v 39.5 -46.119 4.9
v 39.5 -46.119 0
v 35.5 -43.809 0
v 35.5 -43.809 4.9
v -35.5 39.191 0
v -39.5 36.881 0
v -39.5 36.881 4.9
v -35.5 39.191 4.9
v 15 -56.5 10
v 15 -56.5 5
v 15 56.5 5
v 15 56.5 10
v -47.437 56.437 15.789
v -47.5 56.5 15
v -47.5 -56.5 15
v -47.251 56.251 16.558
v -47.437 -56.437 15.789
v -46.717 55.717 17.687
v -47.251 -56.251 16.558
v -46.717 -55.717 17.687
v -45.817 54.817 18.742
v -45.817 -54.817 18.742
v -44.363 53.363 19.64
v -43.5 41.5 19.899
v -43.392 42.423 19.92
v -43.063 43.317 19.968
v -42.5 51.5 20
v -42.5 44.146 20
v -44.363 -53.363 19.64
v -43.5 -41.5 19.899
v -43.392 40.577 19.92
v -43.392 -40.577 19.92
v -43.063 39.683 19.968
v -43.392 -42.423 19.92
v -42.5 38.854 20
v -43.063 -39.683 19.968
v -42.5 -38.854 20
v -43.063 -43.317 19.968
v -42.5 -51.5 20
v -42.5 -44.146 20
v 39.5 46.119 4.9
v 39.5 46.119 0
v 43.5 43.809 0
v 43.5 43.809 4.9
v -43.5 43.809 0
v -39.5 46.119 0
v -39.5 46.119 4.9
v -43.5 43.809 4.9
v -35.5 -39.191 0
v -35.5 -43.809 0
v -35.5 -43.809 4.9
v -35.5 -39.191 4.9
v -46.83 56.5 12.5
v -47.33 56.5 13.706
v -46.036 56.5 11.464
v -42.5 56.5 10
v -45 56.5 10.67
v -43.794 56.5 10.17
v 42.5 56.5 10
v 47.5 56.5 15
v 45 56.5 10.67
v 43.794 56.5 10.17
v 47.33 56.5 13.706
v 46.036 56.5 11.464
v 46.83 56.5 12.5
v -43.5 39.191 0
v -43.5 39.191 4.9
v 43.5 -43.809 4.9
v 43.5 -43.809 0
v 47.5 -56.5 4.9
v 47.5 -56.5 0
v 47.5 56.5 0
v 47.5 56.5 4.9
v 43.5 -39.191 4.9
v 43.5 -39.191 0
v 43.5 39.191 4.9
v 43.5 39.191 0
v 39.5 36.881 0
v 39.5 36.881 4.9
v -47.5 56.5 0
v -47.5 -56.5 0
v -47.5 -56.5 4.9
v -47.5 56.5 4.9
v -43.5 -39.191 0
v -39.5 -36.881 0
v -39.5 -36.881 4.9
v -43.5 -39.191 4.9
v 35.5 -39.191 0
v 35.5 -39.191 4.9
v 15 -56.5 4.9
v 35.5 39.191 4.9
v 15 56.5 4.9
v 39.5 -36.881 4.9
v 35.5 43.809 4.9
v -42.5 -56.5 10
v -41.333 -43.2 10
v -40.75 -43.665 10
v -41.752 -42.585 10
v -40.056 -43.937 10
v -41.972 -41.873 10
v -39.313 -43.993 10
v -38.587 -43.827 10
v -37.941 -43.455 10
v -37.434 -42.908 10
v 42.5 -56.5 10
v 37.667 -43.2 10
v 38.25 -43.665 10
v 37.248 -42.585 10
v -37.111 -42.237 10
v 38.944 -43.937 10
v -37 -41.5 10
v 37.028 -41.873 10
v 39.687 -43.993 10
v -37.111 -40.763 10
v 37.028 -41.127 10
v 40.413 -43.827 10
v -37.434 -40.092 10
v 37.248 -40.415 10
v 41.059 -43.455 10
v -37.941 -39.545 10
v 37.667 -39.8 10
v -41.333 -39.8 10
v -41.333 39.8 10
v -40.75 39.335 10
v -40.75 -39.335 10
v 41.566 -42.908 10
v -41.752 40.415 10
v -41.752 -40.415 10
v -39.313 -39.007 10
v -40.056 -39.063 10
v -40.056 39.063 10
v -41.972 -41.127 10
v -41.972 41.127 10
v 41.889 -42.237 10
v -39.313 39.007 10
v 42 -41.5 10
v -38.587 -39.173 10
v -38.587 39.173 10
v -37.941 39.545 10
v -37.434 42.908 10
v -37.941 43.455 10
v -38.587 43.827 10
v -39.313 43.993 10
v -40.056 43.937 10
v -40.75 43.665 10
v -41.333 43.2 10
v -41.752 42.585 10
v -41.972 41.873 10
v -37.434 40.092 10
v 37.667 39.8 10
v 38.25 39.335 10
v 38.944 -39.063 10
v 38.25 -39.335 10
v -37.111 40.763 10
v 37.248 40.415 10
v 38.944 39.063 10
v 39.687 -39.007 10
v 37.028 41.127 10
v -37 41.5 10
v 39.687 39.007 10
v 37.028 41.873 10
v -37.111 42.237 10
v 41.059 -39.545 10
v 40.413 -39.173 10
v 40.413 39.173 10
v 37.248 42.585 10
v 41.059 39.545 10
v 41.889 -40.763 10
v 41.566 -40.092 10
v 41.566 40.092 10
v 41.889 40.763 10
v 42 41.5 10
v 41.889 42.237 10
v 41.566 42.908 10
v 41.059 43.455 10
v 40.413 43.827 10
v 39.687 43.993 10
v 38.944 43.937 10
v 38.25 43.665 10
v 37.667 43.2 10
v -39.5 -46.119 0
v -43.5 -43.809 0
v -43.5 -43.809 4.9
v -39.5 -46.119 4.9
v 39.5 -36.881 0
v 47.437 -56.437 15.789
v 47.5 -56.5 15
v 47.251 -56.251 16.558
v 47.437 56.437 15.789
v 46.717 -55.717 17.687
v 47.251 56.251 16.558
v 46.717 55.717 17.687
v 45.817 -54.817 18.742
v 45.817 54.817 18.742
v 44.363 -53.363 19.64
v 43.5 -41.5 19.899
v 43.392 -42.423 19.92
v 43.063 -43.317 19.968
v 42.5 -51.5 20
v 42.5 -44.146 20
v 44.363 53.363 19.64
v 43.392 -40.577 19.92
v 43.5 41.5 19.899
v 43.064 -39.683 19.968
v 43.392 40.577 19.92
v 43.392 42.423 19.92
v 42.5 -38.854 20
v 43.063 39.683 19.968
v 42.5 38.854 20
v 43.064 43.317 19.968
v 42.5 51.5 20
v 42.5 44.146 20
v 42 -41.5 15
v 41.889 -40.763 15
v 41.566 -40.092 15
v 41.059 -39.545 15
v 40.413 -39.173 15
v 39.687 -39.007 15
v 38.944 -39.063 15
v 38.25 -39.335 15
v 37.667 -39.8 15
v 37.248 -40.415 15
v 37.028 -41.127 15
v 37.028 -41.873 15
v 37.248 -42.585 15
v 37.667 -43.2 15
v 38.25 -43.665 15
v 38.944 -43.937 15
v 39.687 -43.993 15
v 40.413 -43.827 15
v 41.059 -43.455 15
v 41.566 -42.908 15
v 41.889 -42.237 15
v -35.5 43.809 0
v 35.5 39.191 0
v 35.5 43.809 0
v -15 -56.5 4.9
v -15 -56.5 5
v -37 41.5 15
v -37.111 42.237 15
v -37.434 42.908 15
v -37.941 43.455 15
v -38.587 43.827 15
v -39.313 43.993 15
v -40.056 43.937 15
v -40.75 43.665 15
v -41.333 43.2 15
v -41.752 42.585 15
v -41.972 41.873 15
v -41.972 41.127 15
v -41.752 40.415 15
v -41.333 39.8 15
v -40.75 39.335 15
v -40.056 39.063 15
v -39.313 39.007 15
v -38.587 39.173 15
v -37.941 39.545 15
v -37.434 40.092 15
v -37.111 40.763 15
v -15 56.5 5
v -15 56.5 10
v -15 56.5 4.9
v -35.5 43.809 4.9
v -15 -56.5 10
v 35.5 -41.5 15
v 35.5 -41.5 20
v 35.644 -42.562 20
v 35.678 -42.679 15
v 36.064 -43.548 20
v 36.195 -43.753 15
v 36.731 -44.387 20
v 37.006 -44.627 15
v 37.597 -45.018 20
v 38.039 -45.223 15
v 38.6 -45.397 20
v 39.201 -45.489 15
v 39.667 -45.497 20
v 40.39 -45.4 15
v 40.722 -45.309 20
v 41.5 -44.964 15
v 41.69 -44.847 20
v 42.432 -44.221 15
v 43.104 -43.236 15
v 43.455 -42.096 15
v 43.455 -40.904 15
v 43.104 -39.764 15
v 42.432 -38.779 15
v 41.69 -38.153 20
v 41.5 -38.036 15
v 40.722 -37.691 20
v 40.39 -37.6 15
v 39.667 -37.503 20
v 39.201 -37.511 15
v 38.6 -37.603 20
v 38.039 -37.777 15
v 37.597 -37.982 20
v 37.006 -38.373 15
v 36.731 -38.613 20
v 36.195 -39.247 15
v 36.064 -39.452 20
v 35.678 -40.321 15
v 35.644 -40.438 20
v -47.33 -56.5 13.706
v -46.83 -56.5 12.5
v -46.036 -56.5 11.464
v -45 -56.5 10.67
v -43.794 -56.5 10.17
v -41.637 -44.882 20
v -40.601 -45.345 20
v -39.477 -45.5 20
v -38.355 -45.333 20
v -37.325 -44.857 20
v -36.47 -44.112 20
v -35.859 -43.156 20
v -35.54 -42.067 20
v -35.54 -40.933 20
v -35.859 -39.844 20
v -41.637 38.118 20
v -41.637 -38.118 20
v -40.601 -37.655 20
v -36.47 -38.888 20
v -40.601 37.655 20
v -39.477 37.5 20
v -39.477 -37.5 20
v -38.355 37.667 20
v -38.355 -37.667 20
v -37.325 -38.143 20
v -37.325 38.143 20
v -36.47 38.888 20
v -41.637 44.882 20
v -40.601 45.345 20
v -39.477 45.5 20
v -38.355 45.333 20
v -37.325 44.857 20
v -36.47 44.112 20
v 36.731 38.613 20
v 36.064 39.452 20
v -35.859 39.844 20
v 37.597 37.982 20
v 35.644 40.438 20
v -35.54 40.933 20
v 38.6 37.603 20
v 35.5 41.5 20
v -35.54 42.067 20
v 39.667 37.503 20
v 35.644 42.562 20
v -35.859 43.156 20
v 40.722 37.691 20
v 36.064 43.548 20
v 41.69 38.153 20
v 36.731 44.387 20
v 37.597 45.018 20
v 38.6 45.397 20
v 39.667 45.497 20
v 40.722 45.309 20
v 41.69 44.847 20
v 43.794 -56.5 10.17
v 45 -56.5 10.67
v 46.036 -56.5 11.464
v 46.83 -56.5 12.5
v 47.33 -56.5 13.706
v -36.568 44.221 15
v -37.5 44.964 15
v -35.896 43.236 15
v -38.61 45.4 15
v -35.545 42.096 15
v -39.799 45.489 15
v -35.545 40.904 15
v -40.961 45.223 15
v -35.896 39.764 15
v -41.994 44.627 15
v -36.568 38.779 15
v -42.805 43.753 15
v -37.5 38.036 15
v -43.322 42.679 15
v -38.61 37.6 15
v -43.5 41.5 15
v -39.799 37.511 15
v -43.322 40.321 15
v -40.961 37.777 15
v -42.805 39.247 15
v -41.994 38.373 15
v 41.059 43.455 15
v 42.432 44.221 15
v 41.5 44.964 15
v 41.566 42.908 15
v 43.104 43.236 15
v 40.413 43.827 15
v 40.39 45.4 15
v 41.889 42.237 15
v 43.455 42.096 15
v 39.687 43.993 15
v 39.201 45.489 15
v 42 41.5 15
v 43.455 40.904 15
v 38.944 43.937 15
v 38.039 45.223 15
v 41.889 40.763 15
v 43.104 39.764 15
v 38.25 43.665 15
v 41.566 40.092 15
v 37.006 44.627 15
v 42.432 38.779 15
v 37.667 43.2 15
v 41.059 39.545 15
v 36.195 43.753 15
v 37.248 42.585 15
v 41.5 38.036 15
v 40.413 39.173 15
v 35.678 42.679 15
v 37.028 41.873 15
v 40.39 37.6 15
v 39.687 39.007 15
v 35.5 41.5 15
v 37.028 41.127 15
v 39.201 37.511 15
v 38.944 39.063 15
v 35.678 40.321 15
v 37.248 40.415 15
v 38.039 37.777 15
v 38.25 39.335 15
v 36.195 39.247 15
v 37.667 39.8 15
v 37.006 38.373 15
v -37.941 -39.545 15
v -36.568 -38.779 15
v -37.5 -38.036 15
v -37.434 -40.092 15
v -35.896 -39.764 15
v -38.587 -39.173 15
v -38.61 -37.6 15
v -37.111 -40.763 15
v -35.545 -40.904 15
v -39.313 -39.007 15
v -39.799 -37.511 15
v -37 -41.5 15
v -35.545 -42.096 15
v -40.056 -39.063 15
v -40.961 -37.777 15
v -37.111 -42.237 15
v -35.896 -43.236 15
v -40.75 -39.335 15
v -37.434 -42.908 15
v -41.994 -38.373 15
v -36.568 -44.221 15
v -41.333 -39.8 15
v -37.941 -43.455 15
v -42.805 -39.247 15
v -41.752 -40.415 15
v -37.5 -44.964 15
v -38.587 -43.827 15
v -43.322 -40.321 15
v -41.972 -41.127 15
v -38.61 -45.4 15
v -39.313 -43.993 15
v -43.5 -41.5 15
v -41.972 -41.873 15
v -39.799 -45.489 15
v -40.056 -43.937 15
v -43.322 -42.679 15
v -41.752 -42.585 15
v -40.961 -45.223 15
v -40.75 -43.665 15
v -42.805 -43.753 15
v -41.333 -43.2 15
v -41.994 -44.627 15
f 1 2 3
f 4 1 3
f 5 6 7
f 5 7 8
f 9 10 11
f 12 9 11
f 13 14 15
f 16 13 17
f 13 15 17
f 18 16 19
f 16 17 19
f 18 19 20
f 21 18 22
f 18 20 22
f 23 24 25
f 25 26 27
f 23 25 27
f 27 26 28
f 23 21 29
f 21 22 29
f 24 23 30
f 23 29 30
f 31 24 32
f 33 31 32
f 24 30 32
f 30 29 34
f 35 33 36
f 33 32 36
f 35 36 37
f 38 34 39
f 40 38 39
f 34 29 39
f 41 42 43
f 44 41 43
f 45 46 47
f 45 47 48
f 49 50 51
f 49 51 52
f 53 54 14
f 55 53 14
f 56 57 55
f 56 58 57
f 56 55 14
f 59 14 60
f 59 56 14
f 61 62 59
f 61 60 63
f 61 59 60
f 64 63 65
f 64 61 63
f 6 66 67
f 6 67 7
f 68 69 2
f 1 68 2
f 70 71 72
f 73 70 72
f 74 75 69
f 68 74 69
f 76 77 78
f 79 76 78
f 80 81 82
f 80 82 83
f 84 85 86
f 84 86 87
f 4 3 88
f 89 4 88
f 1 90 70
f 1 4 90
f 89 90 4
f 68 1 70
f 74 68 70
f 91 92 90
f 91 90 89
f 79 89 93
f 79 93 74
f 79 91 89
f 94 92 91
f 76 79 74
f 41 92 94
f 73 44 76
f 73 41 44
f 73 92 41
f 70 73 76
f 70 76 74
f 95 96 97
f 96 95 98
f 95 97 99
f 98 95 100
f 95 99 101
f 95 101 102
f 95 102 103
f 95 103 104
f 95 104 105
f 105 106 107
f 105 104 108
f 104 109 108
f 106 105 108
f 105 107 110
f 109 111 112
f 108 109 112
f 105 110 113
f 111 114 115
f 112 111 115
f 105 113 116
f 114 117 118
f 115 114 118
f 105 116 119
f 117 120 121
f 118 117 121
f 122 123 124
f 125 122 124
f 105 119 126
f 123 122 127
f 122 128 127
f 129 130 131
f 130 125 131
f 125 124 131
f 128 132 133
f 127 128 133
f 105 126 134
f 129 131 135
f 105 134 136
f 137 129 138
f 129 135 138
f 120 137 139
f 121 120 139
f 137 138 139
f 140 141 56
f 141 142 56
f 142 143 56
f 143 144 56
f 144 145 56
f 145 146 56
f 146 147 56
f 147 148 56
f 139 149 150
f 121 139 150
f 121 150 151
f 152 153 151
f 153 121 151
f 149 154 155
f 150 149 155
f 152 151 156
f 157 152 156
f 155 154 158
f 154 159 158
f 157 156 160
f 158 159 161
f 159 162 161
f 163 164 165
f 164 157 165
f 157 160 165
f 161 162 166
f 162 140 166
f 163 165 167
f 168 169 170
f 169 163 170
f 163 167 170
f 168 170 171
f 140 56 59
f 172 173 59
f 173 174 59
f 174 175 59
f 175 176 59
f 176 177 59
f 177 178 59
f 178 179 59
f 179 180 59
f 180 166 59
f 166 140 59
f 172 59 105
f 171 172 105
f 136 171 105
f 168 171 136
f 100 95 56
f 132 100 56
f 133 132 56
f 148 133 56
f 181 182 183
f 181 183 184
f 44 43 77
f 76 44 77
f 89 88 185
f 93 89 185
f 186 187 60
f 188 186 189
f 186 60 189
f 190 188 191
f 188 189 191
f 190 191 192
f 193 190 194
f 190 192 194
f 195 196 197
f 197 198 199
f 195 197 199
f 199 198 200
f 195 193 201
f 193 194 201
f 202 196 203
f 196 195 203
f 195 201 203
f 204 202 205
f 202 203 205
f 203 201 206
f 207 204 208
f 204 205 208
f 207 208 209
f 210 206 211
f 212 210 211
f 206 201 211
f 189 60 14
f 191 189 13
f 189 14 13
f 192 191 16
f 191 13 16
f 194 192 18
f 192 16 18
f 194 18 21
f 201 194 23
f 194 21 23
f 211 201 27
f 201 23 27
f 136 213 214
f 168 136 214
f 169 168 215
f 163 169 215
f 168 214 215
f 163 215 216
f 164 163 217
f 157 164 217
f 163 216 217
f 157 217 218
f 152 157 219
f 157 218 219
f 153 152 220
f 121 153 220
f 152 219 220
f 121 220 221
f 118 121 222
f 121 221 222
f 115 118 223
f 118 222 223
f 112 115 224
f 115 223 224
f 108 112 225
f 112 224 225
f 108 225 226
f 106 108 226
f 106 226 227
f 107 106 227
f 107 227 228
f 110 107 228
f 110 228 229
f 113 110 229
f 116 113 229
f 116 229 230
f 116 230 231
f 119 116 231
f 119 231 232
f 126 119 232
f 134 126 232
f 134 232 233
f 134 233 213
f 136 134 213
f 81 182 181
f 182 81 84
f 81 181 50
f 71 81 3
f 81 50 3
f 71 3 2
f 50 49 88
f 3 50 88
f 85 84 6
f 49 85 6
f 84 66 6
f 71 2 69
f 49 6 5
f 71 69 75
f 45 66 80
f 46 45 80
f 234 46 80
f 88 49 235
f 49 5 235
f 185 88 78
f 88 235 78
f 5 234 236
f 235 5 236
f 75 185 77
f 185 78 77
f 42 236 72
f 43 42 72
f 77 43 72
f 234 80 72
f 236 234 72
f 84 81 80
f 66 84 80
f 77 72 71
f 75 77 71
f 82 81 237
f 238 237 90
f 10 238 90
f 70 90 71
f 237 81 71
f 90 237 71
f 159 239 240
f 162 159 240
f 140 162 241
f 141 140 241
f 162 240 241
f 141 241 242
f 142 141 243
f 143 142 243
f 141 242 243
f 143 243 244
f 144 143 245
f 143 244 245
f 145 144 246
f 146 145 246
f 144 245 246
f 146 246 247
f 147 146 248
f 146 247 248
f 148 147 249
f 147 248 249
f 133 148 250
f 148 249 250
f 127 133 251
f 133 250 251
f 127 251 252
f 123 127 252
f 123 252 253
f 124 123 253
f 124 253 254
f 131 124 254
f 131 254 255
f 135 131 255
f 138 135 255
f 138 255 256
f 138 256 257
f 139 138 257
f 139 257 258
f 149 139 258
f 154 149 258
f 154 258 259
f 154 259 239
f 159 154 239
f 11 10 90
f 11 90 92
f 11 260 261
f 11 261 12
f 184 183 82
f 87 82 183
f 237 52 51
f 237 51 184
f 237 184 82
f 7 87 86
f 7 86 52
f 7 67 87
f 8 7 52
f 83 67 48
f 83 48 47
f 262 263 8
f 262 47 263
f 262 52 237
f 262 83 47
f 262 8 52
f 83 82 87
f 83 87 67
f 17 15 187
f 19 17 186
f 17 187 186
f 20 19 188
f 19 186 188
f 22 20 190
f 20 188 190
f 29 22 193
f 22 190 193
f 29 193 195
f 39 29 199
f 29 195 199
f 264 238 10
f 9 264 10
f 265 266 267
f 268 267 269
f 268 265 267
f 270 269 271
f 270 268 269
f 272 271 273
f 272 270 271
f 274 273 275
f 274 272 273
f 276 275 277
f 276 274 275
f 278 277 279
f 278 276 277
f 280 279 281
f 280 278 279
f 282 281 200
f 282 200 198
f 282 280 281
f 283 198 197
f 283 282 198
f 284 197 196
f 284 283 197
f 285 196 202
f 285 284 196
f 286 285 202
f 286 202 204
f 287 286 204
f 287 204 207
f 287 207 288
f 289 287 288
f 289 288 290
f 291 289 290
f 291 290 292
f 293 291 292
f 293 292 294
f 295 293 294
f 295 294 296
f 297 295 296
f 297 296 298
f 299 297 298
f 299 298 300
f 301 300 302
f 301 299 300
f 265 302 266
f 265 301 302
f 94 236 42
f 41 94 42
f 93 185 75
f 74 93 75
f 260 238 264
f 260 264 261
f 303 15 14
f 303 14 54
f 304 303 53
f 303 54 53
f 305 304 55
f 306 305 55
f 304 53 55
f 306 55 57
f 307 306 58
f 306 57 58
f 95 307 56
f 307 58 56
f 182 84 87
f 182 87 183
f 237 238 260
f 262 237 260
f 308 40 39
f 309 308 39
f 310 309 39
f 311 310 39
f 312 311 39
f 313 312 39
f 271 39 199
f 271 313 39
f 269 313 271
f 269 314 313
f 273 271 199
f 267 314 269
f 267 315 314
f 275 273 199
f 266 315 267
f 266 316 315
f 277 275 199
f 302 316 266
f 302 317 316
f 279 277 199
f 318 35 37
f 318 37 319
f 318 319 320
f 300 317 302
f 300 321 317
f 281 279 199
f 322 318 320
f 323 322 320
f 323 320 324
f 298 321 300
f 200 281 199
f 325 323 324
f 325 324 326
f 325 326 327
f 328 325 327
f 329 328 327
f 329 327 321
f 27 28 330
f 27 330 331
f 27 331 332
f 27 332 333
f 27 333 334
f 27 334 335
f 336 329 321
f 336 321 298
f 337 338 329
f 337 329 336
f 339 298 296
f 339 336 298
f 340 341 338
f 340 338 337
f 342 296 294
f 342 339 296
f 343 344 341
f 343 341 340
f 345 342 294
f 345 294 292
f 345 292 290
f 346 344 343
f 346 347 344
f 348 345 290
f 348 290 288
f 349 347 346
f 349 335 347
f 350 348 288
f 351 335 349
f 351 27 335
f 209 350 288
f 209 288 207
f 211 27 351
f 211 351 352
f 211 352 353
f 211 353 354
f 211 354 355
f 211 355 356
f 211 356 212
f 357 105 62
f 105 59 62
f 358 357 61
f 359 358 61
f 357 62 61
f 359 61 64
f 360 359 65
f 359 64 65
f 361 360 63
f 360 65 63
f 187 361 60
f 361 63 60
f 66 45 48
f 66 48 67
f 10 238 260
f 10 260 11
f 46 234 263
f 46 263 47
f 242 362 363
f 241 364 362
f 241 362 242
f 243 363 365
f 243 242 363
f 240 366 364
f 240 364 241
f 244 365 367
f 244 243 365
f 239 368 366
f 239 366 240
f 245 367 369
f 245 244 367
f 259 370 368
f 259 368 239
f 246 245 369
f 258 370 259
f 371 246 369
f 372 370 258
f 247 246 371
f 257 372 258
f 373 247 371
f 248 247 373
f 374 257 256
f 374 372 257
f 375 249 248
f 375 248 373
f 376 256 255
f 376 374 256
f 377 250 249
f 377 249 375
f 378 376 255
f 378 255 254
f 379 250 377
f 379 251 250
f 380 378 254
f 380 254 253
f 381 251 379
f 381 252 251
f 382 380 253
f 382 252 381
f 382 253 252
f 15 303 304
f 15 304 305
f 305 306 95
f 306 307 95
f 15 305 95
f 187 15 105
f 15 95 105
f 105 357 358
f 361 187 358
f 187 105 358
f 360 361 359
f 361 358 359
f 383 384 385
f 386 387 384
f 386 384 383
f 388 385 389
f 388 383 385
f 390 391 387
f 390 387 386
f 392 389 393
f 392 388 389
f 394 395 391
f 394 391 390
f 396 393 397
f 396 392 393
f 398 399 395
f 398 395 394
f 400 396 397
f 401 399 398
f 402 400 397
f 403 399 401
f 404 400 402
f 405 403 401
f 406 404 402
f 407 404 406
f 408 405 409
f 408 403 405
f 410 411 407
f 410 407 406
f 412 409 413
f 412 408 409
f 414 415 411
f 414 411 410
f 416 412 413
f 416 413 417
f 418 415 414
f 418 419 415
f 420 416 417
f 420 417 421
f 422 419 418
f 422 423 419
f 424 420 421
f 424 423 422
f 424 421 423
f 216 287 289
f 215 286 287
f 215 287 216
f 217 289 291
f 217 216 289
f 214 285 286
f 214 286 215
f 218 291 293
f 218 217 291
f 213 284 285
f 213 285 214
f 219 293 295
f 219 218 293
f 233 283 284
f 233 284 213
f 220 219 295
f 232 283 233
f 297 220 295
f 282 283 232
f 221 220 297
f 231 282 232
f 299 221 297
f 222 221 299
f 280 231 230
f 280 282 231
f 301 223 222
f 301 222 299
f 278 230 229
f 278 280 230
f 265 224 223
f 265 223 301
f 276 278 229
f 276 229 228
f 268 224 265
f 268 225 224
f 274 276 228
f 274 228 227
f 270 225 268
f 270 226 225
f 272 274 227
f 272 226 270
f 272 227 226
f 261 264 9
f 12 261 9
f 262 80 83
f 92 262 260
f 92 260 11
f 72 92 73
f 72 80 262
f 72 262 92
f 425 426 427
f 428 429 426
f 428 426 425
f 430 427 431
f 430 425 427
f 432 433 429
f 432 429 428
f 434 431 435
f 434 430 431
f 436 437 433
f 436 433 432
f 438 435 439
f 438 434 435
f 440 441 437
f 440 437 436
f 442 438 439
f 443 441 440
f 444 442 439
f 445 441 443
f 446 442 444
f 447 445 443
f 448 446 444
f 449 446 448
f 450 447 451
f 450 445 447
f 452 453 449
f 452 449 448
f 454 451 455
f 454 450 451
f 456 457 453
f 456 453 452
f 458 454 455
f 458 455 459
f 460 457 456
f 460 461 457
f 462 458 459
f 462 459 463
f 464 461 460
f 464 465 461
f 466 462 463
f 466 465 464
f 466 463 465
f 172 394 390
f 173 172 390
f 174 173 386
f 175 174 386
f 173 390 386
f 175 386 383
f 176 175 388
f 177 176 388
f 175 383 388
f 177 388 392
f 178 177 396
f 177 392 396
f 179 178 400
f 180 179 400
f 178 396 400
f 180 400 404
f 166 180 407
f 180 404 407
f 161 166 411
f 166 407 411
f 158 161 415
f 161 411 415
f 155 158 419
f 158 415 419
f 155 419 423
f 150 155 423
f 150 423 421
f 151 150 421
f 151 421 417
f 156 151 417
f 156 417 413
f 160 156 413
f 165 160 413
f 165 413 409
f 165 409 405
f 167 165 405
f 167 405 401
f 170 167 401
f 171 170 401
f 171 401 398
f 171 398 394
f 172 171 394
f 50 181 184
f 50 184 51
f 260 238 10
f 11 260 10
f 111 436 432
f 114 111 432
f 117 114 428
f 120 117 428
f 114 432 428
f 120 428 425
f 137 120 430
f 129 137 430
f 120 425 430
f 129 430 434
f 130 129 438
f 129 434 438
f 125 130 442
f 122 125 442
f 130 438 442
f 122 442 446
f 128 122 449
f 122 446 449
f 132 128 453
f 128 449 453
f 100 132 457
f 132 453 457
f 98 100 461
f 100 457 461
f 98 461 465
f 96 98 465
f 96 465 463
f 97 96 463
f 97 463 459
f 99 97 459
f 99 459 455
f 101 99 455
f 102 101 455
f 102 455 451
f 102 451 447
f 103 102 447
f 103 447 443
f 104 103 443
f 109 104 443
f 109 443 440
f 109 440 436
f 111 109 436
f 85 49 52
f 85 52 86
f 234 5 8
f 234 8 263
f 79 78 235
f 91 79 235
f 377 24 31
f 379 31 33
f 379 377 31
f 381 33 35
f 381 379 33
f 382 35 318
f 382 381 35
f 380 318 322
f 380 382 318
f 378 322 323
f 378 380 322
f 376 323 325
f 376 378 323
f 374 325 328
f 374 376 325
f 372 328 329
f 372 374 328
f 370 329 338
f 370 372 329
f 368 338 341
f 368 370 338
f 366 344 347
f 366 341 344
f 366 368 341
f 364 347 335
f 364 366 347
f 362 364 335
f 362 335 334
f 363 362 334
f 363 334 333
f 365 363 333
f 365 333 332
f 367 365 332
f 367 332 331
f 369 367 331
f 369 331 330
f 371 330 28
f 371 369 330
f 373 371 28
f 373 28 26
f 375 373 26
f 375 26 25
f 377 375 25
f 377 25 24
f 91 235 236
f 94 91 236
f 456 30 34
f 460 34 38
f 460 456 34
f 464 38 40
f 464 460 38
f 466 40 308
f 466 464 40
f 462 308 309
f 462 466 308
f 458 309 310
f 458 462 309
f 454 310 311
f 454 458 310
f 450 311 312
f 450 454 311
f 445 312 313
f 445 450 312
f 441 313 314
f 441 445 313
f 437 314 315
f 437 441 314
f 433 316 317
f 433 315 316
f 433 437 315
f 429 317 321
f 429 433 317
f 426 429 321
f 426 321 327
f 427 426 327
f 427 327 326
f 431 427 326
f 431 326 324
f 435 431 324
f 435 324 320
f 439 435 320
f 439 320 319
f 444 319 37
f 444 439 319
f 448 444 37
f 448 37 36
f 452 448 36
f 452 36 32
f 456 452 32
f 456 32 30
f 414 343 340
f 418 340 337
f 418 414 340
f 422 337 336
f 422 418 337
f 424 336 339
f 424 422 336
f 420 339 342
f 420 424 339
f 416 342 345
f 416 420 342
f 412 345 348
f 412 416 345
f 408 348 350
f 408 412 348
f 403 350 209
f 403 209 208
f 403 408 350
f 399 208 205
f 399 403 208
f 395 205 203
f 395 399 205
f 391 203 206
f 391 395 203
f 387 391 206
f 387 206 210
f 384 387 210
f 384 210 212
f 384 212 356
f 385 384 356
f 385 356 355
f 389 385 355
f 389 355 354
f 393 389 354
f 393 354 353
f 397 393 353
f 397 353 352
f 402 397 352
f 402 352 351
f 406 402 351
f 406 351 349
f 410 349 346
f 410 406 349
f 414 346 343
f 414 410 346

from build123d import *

# Parameters (mm, degrees)
CROQUIS1_W                 = 95
CROQUIS1_H                 = 113
SALIENTE_EXTRUIR1_DEPTH    = 5
CROQUIS2_W                 = 30
CROQUIS2_H                 = 113
SALIENTE_EXTRUIR2_DEPTH    = 5
CROQUIS3_W                 = 95
CROQUIS3_H                 = 113
SALIENTE_EXTRUIR3_DEPTH    = 10
CORTAR_EXTRUIR3_DEPTH      = 77.475486268
CORTAR_EXTRUIR3_DEPTH_BACK = 5
CROQUIS4_R                 = 4
CROQUIS5_R                 = 2.5
CORTAR_EXTRUIR7_DEPTH      = 77.475486268
REDONDEO3_R                = 5
REDONDEO2_R                = 5
CROQUIS6_W                 = 32.5
CROQUIS6_H                 = 113
CORTAR_EXTRUIR8_DEPTH      = 0.1


# Some blends are built 0.0001 mm under size
with BuildPart() as part:
    # Croquis1 → Saliente-Extruir1 (new body)
    with BuildSketch(Plane.XY):
        Rectangle(CROQUIS1_W, CROQUIS1_H)
        Polygon((-35.5, 39.190598923), (-35.5, 43.809401077), (-39.5, 46.118802154), (-43.5, 43.809401077), (-43.5, 39.190598923), (-39.5, 36.881197846), align=None, mode=Mode.SUBTRACT)
        Polygon((-35.5, -43.809401077), (-35.5, -39.190598923), (-39.5, -36.881197846), (-43.5, -39.190598923), (-43.5, -43.809401077), (-39.5, -46.118802154), align=None, mode=Mode.SUBTRACT)
        Polygon((39.5, -46.118802154), (35.5, -43.809401077), (35.5, -39.190598923), (39.5, -36.881197846), (43.5, -39.190598923), (43.5, -43.809401077), align=None, mode=Mode.SUBTRACT)
        Polygon((39.5, 36.881197846), (35.5, 39.190598923), (35.5, 43.809401077), (39.5, 46.118802154), (43.5, 43.809401077), (43.5, 39.190598923), align=None, mode=Mode.SUBTRACT)
    extrude(amount=SALIENTE_EXTRUIR1_DEPTH)

    # Croquis6 → Cortar-Extruir8 (cut)
    with BuildSketch(Plane.XY.offset(5)):
        with Locations((-31.25, 0)):
            Rectangle(CROQUIS6_W, CROQUIS6_H)
        with Locations((31.25, 0)):
            Rectangle(CROQUIS6_W, CROQUIS6_H)
    extrude(amount=-CORTAR_EXTRUIR8_DEPTH, mode=Mode.SUBTRACT)


with BuildPart() as body_2:
    # Croquis2 → Saliente-Extruir2 (new body)
    with BuildSketch(Plane.XY.offset(5)):
        Rectangle(CROQUIS2_W, CROQUIS2_H)
    extrude(amount=SALIENTE_EXTRUIR2_DEPTH)


with BuildPart() as body_3:
    # Croquis3 → Saliente-Extruir3 (new body)
    with BuildSketch(Plane.XY.offset(10)):
        Rectangle(CROQUIS3_W, CROQUIS3_H)
    extrude(amount=SALIENTE_EXTRUIR3_DEPTH)

    # Croquis4 → Cortar-Extruir3 (cut, two sides: drawn at the far end of the back side and taken through both)
    with BuildSketch(Plane.XY.offset(20).offset(-CORTAR_EXTRUIR3_DEPTH_BACK)):
        with Locations(Location((39.5, 41.5, 0), (0, 0, 180))):
            Circle(CROQUIS4_R)
        with Locations(Location((-39.5, 41.5, 0), (0, 0, 180))):
            Circle(CROQUIS4_R)
        with Locations(Location((-39.5, -41.5, 0), (0, 0, 180))):
            Circle(CROQUIS4_R)
        with Locations(Location((39.5, -41.5, 0), (0, 0, 180))):
            Circle(CROQUIS4_R)
    extrude(amount=CORTAR_EXTRUIR3_DEPTH + CORTAR_EXTRUIR3_DEPTH_BACK, mode=Mode.SUBTRACT)

    # Croquis5 → Cortar-Extruir7 (cut, through all)
    with BuildSketch(Plane.XY.offset(20)):
        with Locations((-39.5, 41.5)):
            Circle(CROQUIS5_R)
        with Locations((39.5, 41.5)):
            Circle(CROQUIS5_R)
        with Locations((-39.5, -41.5)):
            Circle(CROQUIS5_R)
        with Locations((39.5, -41.5)):
            Circle(CROQUIS5_R)
    extrude(amount=-CORTAR_EXTRUIR7_DEPTH, mode=Mode.SUBTRACT)

    # Redondeo3
    # the kernel refuses this fillet: 5 mm, written as the material it takes off along each edge
    with BuildSketch(Plane(origin=(47.5, 69, 20), x_dir=(0, 0, -1), z_dir=(0, -1, 0)), Plane(origin=(-47.5, -69, 20), x_dir=(0, 0, -1), z_dir=(0, 1, 0))) as redondeo3_piece_1:
        with BuildLine():
            CenterArc((REDONDEO3_R, -REDONDEO3_R), REDONDEO3_R, 90, 90)
            Line((0, -REDONDEO3_R), (0, 0))
            Line((0, 0), (REDONDEO3_R, 0))
        make_face()
    extrude(amount=138, mode=Mode.SUBTRACT)
    with BuildSketch(Plane(origin=(-60, 56.5, 20), x_dir=(0, 0, -1), z_dir=(1, 0, 0))) as redondeo3_piece_2:
        with BuildLine():
            CenterArc((REDONDEO3_R, -REDONDEO3_R), REDONDEO3_R, 90, 90)
            Line((0, -REDONDEO3_R), (0, 0))
            Line((0, 0), (REDONDEO3_R, 0))
        make_face()
    extrude(amount=120, mode=Mode.SUBTRACT)
    with BuildSketch(Plane(origin=(60, -56.5, 20), x_dir=(0, 1, 0), z_dir=(-1, 0, 0))) as redondeo3_piece_3:
        with BuildLine():
            CenterArc((REDONDEO3_R, REDONDEO3_R), REDONDEO3_R, 180, 90)
            Line((0, REDONDEO3_R), (0, 0))
            Line((0, 0), (REDONDEO3_R, 0))
        make_face()
    extrude(amount=120, mode=Mode.SUBTRACT)

    # Redondeo2
    redondeo2_edges = [body_3.edges().sort_by_distance(p)[0] for p in [
        (47.5, 0, 10),
        (-47.5, 0, 10),
    ]]
    fillet(redondeo2_edges, radius=REDONDEO2_R - 0.0001)  # a hair under: the kernel refuses the full size


solid = Compound([part.part, body_2.part, body_3.part])
